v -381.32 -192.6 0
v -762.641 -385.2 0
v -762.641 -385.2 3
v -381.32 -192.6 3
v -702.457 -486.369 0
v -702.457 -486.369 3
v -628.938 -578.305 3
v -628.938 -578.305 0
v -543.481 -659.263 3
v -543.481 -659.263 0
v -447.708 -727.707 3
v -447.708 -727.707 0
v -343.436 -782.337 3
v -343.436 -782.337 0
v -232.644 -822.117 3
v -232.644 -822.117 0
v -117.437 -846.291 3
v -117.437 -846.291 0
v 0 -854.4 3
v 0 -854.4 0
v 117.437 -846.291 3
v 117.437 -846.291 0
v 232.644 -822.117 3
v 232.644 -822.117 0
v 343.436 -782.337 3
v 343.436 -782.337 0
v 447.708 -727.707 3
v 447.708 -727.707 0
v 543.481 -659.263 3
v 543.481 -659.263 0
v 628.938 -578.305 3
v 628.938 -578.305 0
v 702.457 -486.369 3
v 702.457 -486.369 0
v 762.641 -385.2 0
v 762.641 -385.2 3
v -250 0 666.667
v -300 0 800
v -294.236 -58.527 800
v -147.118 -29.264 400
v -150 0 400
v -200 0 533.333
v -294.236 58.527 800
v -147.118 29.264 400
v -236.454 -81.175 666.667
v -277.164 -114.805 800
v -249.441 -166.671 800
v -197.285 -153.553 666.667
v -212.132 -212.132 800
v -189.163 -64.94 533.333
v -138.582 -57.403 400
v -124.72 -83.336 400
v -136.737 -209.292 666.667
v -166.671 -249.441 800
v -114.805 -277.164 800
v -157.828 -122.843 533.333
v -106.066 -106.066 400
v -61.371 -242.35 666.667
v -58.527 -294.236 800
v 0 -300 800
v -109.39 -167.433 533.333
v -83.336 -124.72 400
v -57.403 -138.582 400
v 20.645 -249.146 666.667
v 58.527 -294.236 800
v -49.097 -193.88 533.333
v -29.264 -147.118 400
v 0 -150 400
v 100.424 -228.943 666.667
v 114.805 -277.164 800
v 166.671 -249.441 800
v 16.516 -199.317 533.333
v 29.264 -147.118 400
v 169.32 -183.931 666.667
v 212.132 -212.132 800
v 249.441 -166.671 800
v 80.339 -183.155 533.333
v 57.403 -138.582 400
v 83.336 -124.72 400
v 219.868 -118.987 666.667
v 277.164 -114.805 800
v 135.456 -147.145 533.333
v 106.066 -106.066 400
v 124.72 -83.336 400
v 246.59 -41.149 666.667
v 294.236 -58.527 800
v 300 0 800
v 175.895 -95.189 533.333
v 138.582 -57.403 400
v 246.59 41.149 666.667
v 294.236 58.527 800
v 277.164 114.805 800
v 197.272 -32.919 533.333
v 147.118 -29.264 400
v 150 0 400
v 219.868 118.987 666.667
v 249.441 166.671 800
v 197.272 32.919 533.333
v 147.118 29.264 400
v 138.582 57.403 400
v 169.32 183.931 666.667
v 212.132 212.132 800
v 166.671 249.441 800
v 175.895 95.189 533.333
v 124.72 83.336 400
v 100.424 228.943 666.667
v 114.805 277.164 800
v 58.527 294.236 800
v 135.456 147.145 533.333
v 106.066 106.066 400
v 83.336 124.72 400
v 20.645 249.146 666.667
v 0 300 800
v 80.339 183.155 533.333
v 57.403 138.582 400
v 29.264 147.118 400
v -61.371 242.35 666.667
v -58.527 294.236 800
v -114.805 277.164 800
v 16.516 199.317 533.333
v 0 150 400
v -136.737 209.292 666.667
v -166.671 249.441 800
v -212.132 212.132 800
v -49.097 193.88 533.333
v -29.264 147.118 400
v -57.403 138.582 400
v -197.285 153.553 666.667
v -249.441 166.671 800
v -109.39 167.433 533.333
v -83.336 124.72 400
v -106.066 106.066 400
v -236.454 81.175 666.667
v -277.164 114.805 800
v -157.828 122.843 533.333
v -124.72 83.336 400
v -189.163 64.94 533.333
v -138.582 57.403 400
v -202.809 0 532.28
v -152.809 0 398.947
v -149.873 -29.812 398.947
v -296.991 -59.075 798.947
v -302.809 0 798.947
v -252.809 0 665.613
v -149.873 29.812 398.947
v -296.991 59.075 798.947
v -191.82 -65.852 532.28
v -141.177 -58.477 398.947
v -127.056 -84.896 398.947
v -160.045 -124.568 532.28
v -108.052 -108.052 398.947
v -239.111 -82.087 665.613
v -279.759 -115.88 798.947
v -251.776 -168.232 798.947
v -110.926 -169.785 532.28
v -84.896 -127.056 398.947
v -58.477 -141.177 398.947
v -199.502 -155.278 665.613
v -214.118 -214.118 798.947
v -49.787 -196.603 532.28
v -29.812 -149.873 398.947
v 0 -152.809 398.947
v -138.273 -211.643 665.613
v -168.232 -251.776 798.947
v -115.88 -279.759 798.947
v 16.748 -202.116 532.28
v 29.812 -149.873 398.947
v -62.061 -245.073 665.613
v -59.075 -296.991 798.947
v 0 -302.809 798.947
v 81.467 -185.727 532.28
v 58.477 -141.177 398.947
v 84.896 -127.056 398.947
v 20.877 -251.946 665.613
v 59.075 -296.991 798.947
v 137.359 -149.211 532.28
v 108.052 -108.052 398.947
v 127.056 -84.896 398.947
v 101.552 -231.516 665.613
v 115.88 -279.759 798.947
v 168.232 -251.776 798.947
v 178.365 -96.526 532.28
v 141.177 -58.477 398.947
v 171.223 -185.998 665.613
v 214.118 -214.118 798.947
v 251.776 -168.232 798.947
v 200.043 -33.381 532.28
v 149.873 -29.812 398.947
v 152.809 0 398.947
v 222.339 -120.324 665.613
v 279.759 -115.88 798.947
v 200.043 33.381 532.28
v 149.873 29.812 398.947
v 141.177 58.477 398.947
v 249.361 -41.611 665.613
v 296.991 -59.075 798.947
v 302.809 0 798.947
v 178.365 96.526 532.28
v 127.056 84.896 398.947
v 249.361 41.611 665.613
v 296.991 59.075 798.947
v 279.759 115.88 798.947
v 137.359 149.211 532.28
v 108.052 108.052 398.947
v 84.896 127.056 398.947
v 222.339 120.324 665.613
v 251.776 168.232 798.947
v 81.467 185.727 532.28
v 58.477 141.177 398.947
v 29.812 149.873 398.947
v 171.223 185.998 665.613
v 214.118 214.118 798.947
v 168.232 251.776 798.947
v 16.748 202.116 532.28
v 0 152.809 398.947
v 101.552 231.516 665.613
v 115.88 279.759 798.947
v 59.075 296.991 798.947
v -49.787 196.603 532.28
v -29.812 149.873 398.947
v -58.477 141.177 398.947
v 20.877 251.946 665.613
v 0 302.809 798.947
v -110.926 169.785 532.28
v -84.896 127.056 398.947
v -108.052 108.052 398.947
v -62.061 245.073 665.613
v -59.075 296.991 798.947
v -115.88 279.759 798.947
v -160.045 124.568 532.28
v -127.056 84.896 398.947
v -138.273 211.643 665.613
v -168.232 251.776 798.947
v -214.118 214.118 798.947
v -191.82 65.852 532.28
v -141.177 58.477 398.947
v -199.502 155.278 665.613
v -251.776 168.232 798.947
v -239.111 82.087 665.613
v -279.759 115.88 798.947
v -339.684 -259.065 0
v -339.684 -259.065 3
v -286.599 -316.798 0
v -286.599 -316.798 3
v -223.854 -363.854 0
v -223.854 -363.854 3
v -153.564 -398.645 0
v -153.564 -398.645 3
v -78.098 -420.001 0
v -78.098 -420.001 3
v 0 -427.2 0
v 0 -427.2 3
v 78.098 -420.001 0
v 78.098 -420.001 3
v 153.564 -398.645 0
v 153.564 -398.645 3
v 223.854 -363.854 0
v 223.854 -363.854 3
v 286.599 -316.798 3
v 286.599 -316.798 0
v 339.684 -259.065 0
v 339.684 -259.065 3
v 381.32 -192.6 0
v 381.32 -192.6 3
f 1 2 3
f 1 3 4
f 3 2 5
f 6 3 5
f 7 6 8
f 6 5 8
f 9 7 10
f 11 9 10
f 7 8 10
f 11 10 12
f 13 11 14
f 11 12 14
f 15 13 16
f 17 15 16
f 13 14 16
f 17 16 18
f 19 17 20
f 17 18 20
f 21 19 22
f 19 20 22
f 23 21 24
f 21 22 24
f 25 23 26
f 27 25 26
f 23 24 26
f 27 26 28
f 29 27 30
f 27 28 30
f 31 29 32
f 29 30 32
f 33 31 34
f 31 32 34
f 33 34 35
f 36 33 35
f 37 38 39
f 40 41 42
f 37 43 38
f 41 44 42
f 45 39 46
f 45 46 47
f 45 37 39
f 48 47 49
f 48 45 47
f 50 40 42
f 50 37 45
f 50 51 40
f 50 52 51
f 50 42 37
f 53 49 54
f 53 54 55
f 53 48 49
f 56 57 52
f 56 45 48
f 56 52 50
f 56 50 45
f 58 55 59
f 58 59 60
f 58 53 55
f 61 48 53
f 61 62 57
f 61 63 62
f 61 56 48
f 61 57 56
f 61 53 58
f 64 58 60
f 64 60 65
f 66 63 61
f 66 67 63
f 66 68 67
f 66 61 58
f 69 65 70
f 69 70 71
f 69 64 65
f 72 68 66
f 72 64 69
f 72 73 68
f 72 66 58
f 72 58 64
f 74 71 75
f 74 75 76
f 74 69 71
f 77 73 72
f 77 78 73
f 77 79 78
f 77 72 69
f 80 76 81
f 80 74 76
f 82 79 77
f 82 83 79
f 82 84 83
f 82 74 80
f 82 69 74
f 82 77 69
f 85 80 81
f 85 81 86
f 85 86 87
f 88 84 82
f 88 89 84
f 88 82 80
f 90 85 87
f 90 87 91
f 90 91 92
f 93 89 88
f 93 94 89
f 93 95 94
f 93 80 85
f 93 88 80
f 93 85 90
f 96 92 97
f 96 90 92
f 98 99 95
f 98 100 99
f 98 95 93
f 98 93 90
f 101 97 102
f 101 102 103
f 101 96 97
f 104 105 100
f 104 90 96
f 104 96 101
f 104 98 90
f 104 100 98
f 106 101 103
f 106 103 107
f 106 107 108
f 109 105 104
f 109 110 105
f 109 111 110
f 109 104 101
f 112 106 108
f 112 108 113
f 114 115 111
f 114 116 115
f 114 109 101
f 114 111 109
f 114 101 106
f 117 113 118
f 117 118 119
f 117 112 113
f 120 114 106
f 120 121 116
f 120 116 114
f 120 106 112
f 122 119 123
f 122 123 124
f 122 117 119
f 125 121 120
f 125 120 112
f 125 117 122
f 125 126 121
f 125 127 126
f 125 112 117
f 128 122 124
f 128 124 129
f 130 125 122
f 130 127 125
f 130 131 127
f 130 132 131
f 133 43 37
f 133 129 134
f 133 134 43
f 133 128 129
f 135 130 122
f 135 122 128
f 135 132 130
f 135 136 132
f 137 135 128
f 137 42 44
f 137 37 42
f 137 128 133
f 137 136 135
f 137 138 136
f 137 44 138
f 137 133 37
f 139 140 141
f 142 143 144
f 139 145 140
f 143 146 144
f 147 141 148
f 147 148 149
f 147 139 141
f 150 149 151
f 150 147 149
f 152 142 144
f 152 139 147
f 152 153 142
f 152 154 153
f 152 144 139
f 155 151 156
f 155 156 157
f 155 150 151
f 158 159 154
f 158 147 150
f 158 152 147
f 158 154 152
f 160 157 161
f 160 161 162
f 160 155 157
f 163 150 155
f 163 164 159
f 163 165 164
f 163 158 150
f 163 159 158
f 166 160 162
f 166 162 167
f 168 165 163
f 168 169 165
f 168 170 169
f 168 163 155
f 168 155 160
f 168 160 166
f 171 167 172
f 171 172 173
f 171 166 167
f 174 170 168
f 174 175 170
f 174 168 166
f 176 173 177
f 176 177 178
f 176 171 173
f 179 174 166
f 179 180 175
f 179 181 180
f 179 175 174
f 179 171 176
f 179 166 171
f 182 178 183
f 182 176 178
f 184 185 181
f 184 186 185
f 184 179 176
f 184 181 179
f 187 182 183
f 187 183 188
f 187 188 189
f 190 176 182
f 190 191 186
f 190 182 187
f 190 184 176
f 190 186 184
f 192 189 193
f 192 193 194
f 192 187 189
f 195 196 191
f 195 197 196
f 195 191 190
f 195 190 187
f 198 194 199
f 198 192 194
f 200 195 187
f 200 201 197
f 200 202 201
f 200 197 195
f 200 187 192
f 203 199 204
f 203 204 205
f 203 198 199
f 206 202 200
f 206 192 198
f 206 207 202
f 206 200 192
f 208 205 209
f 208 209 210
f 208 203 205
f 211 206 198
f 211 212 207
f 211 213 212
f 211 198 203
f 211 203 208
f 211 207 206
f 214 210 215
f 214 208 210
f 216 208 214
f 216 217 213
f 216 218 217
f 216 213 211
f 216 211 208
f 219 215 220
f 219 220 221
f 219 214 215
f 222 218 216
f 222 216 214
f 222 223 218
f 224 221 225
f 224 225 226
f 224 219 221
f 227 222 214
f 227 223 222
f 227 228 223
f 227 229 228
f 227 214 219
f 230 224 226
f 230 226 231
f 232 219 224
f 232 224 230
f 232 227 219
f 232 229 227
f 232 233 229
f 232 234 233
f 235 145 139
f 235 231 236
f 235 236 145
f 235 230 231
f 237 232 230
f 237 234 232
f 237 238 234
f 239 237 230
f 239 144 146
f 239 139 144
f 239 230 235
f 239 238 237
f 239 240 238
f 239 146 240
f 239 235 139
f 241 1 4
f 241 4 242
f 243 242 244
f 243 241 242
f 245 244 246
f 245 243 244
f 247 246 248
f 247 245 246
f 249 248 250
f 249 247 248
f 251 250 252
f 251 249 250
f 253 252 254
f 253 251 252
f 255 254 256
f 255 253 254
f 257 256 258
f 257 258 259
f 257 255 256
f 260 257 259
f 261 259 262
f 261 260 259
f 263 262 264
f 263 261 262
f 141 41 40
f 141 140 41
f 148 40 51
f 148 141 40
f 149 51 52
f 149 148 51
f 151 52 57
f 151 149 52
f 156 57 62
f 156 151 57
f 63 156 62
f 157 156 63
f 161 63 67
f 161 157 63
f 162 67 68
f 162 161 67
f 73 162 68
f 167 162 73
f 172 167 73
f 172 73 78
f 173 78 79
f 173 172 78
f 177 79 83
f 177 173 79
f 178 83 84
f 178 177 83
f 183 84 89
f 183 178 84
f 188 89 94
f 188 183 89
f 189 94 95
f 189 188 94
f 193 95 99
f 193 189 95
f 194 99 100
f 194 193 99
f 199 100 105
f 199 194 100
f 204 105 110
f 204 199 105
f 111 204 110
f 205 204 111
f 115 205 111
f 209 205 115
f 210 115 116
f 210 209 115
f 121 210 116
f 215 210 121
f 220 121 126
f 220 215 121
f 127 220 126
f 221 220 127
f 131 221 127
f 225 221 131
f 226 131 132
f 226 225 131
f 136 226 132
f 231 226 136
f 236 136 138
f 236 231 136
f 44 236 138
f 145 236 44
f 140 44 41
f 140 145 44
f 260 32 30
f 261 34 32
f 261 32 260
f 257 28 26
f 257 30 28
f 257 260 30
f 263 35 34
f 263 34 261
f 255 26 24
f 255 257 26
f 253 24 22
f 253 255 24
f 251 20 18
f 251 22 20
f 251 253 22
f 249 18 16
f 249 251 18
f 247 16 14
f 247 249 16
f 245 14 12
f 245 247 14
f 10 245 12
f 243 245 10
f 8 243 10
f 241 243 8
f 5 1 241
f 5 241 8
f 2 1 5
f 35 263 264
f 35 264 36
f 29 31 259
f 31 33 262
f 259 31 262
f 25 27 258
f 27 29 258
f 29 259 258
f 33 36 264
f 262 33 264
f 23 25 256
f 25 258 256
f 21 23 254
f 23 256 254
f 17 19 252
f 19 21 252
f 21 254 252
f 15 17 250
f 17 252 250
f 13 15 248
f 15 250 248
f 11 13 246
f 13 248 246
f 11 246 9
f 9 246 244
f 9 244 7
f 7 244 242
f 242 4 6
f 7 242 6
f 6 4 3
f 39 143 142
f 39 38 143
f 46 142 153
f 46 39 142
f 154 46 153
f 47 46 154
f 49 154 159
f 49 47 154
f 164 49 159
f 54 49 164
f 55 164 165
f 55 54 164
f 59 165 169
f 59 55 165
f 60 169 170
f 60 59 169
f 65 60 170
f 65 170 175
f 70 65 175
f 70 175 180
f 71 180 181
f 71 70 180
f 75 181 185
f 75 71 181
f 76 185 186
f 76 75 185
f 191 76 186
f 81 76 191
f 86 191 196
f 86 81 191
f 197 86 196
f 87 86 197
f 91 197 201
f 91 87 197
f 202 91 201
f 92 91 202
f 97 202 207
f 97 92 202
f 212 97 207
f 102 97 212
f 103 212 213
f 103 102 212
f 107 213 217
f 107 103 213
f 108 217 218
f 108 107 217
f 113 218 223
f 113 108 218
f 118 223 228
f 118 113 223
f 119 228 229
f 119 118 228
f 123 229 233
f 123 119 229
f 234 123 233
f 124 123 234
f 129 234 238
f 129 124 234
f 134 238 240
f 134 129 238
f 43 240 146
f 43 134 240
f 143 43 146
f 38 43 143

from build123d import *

# Parameters (mm, degrees)
PAD_DEPTH = 3


with BuildPart() as body:
    # Sketch → Revolution (revolve)
    with BuildSketch(Plane.XZ):
        Polygon((-300, 800), (-150, 400), (-152.808988, 398.94663), (-302.808988, 798.94663), align=None)
    revolve(axis=Axis((0, 0, 0), (0, 0, 1)))


with BuildPart() as body001:
    # Sketch001 → Pad (new body)
    with BuildSketch(Plane.XY):
        with BuildLine():
            ThreePointArc((-381.32029, -192.600199), (0, -427.200187), (381.32029, -192.600199))
            Line((381.32029, -192.600199), (762.64058, -385.200397))
            ThreePointArc((-762.64058, -385.200397), (0, -854.400375), (762.64058, -385.200397))
            Line((-762.64058, -385.200397), (-381.32029, -192.600199))
        make_face()
    extrude(amount=PAD_DEPTH)


solid = Compound([body.part, body001.part])
